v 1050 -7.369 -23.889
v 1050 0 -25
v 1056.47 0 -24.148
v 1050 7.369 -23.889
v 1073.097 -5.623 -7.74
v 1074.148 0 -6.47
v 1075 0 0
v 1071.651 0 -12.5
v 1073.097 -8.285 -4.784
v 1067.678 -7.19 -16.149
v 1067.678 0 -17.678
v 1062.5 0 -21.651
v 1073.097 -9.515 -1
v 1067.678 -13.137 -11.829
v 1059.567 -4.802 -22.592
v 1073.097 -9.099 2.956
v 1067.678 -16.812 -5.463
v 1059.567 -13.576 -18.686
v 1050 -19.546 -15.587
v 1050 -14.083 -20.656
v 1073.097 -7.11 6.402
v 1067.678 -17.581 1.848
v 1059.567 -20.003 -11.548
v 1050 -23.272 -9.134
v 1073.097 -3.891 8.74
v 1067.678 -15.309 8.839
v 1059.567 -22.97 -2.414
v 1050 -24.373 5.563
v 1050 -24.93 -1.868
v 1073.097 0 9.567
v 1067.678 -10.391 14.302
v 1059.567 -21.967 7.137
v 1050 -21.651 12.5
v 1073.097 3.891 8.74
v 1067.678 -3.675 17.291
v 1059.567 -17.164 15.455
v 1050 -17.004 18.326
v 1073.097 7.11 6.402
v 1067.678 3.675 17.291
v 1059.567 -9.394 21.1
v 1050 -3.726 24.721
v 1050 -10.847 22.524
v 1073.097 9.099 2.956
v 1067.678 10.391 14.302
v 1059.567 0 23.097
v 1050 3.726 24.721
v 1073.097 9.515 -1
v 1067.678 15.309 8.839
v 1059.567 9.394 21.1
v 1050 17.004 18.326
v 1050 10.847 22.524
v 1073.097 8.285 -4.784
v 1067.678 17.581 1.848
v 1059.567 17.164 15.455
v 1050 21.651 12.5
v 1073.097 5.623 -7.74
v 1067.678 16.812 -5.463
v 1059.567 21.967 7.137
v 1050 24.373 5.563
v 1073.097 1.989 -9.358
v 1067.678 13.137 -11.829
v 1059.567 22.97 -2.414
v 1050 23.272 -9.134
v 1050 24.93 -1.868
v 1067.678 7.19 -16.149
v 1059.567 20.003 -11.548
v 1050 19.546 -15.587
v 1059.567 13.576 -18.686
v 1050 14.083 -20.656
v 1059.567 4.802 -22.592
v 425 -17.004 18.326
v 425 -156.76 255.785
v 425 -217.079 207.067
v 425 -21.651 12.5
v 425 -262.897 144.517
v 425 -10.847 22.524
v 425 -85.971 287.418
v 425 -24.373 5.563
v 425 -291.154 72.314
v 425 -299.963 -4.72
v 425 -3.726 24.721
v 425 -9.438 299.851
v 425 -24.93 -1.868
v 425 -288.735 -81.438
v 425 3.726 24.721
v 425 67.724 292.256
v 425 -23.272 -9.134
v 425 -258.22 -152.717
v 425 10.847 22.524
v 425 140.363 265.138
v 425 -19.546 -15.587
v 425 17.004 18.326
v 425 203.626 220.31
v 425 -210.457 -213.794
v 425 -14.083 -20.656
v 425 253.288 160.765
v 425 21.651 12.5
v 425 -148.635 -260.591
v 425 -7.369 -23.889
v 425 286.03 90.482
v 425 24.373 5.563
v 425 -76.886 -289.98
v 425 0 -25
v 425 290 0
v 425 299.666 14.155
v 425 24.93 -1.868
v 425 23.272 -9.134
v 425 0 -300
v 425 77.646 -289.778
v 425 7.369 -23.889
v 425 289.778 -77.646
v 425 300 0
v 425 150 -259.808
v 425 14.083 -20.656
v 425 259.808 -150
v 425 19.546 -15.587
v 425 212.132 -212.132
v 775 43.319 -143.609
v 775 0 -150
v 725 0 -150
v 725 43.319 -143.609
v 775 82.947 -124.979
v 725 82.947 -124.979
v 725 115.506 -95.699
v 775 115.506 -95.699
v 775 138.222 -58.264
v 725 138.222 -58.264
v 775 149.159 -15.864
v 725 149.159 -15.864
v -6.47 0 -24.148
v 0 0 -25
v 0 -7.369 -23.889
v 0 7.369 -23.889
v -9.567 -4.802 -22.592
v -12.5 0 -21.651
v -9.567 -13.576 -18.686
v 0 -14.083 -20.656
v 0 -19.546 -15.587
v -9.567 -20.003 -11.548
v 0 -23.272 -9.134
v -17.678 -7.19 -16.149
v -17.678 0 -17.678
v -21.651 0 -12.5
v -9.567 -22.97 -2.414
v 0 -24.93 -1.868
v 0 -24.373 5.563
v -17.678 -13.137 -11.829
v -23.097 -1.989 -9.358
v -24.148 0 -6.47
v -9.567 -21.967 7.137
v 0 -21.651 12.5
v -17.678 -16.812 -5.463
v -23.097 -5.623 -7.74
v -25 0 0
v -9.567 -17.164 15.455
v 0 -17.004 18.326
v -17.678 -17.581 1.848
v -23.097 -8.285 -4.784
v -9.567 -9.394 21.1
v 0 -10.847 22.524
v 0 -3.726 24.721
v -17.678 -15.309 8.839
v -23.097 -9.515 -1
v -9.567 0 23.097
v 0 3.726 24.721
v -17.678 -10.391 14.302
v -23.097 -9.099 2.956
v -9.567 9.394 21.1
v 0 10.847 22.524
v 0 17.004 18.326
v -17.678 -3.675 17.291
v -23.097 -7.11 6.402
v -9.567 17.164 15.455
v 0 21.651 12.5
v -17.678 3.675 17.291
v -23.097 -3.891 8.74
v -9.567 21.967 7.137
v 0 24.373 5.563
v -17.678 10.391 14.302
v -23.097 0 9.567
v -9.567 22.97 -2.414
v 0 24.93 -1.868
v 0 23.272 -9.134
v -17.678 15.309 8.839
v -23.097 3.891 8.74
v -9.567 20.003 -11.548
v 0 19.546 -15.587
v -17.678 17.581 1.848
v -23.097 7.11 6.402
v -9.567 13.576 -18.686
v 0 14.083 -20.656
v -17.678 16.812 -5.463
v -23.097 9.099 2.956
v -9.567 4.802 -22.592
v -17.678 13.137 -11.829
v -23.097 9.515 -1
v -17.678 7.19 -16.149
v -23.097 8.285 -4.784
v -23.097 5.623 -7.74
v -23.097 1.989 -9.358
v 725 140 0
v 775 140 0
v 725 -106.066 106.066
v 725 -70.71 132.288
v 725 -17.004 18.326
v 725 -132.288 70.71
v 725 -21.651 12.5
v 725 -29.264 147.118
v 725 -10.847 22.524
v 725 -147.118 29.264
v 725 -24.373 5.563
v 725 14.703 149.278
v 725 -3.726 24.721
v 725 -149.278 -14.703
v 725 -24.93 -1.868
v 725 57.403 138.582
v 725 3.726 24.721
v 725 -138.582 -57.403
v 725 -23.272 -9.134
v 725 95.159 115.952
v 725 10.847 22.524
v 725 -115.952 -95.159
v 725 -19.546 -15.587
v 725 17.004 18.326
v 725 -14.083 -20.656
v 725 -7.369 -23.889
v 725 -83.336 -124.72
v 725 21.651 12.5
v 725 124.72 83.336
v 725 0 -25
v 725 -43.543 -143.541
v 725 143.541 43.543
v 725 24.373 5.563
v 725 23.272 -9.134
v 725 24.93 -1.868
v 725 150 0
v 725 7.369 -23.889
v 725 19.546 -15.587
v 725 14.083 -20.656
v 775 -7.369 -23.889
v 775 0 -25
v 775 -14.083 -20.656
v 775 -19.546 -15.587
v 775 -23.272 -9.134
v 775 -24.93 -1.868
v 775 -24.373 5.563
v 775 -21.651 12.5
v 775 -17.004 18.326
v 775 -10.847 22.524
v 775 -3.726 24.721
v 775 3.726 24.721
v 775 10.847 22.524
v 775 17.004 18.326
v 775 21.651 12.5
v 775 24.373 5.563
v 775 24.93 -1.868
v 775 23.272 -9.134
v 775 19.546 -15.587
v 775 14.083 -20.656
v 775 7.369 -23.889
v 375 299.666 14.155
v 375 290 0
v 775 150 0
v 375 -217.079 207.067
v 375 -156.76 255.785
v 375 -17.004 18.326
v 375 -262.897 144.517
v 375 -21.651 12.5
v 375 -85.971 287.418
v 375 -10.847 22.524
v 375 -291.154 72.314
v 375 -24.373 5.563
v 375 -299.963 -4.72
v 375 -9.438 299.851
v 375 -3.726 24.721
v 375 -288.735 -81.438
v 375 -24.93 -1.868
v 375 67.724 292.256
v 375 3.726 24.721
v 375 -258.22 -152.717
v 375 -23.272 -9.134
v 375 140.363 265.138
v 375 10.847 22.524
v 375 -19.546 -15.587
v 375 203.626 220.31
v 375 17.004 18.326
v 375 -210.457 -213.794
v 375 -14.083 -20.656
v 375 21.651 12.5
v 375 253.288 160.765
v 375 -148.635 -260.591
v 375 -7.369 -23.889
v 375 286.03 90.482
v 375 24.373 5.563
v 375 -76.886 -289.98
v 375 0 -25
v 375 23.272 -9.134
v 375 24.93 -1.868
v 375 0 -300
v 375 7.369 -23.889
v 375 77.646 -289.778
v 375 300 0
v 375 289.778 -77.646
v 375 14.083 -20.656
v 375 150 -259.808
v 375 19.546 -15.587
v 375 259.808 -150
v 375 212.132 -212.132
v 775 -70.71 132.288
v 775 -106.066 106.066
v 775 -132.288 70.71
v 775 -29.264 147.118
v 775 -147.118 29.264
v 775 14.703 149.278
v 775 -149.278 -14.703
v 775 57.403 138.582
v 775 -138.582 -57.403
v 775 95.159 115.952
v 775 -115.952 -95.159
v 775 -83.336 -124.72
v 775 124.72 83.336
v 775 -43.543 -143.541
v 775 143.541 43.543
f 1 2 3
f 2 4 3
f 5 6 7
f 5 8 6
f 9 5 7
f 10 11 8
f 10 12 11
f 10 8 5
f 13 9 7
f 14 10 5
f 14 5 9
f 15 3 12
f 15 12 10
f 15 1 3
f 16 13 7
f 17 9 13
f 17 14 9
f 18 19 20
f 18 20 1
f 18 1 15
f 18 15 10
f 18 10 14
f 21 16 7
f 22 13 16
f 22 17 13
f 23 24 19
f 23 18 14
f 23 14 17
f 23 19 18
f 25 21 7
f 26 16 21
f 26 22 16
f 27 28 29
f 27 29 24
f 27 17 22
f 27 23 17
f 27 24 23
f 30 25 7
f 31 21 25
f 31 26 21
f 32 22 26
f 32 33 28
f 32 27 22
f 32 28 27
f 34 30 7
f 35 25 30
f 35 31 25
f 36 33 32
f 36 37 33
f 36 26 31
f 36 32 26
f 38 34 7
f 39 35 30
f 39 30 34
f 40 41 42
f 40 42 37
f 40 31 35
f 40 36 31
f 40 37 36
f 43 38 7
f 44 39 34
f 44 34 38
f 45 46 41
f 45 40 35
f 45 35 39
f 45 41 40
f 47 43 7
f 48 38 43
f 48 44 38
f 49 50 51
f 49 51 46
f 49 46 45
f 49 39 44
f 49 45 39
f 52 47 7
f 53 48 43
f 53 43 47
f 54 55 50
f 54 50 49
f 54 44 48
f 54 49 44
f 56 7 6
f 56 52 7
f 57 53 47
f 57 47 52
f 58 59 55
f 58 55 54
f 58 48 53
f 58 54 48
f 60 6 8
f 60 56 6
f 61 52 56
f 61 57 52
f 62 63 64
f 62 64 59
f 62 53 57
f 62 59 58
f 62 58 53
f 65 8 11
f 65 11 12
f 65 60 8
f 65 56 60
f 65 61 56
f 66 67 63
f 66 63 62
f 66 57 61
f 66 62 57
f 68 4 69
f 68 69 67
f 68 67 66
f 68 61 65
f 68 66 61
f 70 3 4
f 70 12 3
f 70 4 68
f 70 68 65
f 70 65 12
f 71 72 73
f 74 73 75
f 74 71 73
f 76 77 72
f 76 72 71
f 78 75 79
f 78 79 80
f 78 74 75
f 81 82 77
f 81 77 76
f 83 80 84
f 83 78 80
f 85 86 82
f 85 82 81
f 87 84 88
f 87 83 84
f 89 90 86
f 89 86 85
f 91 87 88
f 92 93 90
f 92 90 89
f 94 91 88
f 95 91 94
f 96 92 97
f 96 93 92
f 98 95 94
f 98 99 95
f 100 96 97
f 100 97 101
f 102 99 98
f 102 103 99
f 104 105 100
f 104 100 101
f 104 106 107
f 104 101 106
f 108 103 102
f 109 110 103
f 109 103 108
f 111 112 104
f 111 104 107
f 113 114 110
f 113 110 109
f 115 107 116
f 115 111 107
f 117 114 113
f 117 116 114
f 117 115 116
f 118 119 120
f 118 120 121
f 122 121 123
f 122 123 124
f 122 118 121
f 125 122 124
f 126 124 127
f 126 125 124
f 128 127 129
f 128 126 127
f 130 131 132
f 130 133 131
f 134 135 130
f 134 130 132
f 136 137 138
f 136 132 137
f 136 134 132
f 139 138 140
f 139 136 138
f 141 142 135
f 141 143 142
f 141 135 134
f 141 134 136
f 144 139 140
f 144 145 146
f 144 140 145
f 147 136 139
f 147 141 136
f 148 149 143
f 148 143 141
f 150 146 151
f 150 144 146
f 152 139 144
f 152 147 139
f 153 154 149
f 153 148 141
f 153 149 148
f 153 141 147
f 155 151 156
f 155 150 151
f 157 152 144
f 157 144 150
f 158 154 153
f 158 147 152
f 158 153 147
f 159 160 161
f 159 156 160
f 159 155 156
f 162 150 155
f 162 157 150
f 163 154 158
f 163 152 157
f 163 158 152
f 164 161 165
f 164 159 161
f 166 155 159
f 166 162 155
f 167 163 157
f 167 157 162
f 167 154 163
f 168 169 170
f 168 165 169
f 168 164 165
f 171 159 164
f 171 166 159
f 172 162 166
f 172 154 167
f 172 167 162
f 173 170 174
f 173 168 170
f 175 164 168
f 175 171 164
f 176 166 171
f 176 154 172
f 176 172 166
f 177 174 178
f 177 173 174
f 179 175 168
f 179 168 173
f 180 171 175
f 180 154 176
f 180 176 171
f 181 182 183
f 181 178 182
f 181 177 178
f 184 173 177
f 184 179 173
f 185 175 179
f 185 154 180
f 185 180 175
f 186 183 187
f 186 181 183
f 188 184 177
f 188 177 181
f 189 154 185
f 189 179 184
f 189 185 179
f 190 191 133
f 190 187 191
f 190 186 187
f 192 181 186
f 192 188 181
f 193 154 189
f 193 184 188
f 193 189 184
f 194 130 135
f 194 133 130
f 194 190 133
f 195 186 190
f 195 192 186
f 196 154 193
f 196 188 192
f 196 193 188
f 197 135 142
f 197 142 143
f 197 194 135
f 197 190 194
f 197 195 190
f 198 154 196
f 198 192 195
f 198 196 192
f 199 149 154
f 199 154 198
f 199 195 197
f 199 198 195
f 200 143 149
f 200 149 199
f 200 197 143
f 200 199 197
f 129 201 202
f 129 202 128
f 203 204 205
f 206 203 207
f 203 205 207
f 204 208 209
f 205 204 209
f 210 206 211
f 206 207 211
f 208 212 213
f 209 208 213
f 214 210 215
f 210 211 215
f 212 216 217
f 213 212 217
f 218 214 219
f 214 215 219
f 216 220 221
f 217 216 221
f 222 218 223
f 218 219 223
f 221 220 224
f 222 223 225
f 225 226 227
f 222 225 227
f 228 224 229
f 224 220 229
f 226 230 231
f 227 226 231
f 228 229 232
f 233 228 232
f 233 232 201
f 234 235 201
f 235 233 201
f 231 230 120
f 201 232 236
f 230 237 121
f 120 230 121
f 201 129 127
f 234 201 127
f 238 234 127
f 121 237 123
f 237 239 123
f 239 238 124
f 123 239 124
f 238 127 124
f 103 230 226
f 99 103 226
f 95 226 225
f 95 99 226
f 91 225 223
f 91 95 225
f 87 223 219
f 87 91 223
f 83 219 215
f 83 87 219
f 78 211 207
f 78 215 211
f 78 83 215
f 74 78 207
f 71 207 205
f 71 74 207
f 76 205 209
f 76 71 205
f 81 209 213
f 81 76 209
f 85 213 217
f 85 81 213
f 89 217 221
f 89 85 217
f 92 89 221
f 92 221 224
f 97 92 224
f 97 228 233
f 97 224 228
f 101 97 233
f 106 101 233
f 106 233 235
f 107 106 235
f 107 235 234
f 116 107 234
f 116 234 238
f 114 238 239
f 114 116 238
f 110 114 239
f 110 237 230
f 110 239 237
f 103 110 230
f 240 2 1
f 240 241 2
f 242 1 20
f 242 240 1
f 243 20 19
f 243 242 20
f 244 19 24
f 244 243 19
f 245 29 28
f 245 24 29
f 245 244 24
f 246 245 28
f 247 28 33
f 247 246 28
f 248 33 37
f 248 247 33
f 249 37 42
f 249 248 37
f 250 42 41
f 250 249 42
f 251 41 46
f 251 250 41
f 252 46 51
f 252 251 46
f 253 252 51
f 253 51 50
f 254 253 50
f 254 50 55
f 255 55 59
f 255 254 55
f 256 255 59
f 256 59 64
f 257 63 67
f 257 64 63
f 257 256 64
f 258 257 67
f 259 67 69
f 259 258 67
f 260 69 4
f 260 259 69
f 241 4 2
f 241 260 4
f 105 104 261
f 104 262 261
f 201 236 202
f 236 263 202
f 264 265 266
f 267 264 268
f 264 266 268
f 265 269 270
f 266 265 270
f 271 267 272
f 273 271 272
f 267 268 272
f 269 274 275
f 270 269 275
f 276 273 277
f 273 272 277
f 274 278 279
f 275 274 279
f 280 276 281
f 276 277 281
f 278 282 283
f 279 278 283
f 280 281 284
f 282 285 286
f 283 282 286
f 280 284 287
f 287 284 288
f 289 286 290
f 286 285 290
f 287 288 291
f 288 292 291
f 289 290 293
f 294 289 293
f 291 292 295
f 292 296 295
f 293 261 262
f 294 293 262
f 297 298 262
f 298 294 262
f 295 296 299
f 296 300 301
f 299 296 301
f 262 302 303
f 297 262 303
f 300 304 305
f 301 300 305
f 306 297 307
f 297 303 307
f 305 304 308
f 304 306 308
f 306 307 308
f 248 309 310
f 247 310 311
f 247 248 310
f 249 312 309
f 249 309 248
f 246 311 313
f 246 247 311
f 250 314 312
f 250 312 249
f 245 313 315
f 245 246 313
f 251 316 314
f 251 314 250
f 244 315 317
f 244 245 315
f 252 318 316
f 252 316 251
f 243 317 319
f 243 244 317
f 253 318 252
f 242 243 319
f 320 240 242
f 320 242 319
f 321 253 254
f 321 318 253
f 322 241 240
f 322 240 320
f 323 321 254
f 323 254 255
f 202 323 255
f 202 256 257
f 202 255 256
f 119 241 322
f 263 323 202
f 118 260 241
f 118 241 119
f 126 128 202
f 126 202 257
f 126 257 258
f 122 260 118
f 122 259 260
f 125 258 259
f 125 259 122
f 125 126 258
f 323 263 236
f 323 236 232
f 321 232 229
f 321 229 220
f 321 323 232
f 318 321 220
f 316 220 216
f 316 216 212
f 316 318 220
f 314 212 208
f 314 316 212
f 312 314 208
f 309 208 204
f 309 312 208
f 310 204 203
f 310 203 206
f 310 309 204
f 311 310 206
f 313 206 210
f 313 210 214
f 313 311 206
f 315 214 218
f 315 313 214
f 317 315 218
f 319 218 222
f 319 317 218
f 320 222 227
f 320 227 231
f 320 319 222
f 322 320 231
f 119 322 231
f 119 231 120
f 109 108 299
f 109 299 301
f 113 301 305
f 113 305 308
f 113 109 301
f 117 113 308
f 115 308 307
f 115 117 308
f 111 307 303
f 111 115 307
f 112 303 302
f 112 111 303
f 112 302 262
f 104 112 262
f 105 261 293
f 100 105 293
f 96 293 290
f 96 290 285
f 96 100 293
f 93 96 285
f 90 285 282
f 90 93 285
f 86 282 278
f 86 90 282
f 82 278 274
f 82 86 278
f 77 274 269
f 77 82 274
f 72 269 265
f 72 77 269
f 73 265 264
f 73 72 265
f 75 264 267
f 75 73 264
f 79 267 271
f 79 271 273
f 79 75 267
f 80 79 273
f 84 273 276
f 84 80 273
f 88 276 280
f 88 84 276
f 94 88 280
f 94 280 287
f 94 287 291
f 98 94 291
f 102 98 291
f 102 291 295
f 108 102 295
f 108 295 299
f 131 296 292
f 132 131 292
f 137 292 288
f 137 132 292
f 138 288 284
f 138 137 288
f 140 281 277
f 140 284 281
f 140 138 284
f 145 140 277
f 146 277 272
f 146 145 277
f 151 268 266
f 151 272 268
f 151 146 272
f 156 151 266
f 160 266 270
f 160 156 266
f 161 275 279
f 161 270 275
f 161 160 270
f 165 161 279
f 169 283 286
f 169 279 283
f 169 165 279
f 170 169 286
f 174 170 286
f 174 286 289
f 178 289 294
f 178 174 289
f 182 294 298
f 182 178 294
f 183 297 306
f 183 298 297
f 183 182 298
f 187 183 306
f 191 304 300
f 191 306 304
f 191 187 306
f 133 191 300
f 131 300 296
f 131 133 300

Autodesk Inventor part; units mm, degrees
ref_plane "YZ Plane" through (0, 0, 0) normal (1, 0, 0) x (0, 1, 0)
ref_plane "XZ Plane" through (0, 0, 0) normal (0, 1, 0) x (-1, 0, 0)
ref_plane "XY Plane" through (0, 0, 0) normal (0, 0, 1) x (1, 0, 0)
sketch "Sketch1" plane through (0, 0, 0) normal (0, 1, 0) x (-1, 0, 0)
  line L0 (0, 0) -> (-400, 0) construction
  line L1 (-400, 0) -> (-750, 0)
  line L2 (-750, 0) -> (-1050, 0)
  line L3 (-400, 0) -> (-400, -300) construction
  line L4 (-400, -300) -> (-375, -300) construction
  line L5 (-375, -300) -> (-425, -300)
  line L6 (-425, -300) -> (-425, 0)
  line L7 (-425, 0) -> (-375, 0)
  line L8 (-375, 0) -> (-375, -300)
  line L9 (0, 0) -> (-1050, 0)
  line L10 (-1050, 0) -> (-1050, -25)
  line L11 (-1050, -25) -> (0, -25)
  line L12 (0, -25) -> (0, 0)
  arc A0 (0, -25) -> (25, 0) centre (0, 0) ccw
  line L13 (0, 0) -> (25, 0) construction
  line L14 (-750, 0) -> (-750, -150) construction
  line L15 (-750, -150) -> (-725, -150) construction
  line L16 (-725, -150) -> (-775, -150)
  line L17 (-775, -150) -> (-775, 0)
  line L18 (-775, 0) -> (-725, 0)
  line L19 (-725, 0) -> (-725, -150)
  arc A1 (-1075, 0) -> (-1050, -25) centre (-1050, 0) ccw
  line L20 (-1050, 0) -> (-1075, 0)
  line L21 (25, 0) -> (0, 0)
  point P0 (-775, -25)
  point P1 (-725, -25)
  point P2 (-425, -25)
  point P3 (-375, -25)
  dimension "d0" = 400
  dimension "d1" = 350
  dimension "d2" = 300
  dimension "d3" = 300
  dimension "d4" = 25
  dimension "d5" = 50
  dimension "d6" = 1050
  dimension "d7" = 25
  dimension "d8" = 150
  dimension "d9" = 25
  dimension "d10" = 50
revolve "Revolution1" add sketch "Sketch1" angle 360 about axis through (0, 0, 0) along (1, 0, 0)
sketch "Sketch2" plane through (375, 0, 0) normal (-1, 0, 0) x (0, 0, 1)
  circle A0 centre (0, 0) radius 300 projected
  line L0 (0, 300) -> (0, 290)
  line L1 (0, 290) -> (25.5833, 307.4702)
  point P0 (14.1547, 299.6659)
  dimension "d12" = 10
extrude "Extrusion1" cut sketch "Sketch2" against normal blind 284.25 contours A0 L1 L0 picked at (7.8644, 296.5058)
sketch "Sketch3" plane through (775, 0, 0) normal (1, 0, 0) x (0, 0, -1)
  circle A0 centre (0, 0) radius 150 projected
  line L0 (0, 150) -> (0, 140)
  line L1 (0, 140) -> (62.4254, 176.0413)
  point P0 (15.8635, 149.1588)
  dimension "d15" = 10
  dimension "d16" = 60
extrude "Extrusion2" cut sketch "Sketch3" against normal blind 139 contours A0 L1 L0 picked at (8.8167, 146.2616)
sketch "Sketch4" plane through (375, 0, 0) normal (-1, 0, 0) x (0, -0.0236, 0.9997)
  line L0 (7.0793, 299.9165) -> (-6.8433, 289.9192) projected
  line L1 (-6.8433, 289.9192) -> (-7.0793, 299.9165) projected
  arc A0 (-7.0793, 299.9165) -> (7.0793, 299.9165) centre (0, 0) ccw projected
  circle A1 centre (0, 0) radius 25 projected
sketch "Sketch5" plane through (425, 0, 0) normal (1, 0, 0) x (0, 0.0236, -0.9997)
  line L0 (6.8433, 289.9192) -> (-7.0793, 299.9165) projected
  arc A0 (-7.0793, 299.9165) -> (7.0793, 299.9165) centre (0, 0) ccw projected
  line L1 (7.0793, 299.9165) -> (6.8433, 289.9192) projected
  circle A1 centre (0, 0) radius 25 projected
sketch "Sketch6" plane through (725, 140, 0) normal (-1, 0, 0) x (0, 0, 1)
  line L0 (0, 0) -> (-15.8635, 9.1588) projected
  arc A0 (-15.8635, 9.1588) -> (0, 10) centre (0, -140) ccw projected
  line L1 (0, 10) -> (0, 0) projected
  circle A1 centre (0, -140) radius 25 projected
sketch "Sketch7" plane through (775, 140, 0) normal (1, 0, 0) x (0, 0, -1)
  circle A0 centre (0, -140) radius 25 projected
  line L0 (15.8635, 9.1588) -> (0, 0) projected
  line L1 (0, 0) -> (0, 10) projected
  arc A1 (0, 10) -> (15.8635, 9.1588) centre (0, -140) ccw projected
properties part number "shaft_model" material "Steel"
